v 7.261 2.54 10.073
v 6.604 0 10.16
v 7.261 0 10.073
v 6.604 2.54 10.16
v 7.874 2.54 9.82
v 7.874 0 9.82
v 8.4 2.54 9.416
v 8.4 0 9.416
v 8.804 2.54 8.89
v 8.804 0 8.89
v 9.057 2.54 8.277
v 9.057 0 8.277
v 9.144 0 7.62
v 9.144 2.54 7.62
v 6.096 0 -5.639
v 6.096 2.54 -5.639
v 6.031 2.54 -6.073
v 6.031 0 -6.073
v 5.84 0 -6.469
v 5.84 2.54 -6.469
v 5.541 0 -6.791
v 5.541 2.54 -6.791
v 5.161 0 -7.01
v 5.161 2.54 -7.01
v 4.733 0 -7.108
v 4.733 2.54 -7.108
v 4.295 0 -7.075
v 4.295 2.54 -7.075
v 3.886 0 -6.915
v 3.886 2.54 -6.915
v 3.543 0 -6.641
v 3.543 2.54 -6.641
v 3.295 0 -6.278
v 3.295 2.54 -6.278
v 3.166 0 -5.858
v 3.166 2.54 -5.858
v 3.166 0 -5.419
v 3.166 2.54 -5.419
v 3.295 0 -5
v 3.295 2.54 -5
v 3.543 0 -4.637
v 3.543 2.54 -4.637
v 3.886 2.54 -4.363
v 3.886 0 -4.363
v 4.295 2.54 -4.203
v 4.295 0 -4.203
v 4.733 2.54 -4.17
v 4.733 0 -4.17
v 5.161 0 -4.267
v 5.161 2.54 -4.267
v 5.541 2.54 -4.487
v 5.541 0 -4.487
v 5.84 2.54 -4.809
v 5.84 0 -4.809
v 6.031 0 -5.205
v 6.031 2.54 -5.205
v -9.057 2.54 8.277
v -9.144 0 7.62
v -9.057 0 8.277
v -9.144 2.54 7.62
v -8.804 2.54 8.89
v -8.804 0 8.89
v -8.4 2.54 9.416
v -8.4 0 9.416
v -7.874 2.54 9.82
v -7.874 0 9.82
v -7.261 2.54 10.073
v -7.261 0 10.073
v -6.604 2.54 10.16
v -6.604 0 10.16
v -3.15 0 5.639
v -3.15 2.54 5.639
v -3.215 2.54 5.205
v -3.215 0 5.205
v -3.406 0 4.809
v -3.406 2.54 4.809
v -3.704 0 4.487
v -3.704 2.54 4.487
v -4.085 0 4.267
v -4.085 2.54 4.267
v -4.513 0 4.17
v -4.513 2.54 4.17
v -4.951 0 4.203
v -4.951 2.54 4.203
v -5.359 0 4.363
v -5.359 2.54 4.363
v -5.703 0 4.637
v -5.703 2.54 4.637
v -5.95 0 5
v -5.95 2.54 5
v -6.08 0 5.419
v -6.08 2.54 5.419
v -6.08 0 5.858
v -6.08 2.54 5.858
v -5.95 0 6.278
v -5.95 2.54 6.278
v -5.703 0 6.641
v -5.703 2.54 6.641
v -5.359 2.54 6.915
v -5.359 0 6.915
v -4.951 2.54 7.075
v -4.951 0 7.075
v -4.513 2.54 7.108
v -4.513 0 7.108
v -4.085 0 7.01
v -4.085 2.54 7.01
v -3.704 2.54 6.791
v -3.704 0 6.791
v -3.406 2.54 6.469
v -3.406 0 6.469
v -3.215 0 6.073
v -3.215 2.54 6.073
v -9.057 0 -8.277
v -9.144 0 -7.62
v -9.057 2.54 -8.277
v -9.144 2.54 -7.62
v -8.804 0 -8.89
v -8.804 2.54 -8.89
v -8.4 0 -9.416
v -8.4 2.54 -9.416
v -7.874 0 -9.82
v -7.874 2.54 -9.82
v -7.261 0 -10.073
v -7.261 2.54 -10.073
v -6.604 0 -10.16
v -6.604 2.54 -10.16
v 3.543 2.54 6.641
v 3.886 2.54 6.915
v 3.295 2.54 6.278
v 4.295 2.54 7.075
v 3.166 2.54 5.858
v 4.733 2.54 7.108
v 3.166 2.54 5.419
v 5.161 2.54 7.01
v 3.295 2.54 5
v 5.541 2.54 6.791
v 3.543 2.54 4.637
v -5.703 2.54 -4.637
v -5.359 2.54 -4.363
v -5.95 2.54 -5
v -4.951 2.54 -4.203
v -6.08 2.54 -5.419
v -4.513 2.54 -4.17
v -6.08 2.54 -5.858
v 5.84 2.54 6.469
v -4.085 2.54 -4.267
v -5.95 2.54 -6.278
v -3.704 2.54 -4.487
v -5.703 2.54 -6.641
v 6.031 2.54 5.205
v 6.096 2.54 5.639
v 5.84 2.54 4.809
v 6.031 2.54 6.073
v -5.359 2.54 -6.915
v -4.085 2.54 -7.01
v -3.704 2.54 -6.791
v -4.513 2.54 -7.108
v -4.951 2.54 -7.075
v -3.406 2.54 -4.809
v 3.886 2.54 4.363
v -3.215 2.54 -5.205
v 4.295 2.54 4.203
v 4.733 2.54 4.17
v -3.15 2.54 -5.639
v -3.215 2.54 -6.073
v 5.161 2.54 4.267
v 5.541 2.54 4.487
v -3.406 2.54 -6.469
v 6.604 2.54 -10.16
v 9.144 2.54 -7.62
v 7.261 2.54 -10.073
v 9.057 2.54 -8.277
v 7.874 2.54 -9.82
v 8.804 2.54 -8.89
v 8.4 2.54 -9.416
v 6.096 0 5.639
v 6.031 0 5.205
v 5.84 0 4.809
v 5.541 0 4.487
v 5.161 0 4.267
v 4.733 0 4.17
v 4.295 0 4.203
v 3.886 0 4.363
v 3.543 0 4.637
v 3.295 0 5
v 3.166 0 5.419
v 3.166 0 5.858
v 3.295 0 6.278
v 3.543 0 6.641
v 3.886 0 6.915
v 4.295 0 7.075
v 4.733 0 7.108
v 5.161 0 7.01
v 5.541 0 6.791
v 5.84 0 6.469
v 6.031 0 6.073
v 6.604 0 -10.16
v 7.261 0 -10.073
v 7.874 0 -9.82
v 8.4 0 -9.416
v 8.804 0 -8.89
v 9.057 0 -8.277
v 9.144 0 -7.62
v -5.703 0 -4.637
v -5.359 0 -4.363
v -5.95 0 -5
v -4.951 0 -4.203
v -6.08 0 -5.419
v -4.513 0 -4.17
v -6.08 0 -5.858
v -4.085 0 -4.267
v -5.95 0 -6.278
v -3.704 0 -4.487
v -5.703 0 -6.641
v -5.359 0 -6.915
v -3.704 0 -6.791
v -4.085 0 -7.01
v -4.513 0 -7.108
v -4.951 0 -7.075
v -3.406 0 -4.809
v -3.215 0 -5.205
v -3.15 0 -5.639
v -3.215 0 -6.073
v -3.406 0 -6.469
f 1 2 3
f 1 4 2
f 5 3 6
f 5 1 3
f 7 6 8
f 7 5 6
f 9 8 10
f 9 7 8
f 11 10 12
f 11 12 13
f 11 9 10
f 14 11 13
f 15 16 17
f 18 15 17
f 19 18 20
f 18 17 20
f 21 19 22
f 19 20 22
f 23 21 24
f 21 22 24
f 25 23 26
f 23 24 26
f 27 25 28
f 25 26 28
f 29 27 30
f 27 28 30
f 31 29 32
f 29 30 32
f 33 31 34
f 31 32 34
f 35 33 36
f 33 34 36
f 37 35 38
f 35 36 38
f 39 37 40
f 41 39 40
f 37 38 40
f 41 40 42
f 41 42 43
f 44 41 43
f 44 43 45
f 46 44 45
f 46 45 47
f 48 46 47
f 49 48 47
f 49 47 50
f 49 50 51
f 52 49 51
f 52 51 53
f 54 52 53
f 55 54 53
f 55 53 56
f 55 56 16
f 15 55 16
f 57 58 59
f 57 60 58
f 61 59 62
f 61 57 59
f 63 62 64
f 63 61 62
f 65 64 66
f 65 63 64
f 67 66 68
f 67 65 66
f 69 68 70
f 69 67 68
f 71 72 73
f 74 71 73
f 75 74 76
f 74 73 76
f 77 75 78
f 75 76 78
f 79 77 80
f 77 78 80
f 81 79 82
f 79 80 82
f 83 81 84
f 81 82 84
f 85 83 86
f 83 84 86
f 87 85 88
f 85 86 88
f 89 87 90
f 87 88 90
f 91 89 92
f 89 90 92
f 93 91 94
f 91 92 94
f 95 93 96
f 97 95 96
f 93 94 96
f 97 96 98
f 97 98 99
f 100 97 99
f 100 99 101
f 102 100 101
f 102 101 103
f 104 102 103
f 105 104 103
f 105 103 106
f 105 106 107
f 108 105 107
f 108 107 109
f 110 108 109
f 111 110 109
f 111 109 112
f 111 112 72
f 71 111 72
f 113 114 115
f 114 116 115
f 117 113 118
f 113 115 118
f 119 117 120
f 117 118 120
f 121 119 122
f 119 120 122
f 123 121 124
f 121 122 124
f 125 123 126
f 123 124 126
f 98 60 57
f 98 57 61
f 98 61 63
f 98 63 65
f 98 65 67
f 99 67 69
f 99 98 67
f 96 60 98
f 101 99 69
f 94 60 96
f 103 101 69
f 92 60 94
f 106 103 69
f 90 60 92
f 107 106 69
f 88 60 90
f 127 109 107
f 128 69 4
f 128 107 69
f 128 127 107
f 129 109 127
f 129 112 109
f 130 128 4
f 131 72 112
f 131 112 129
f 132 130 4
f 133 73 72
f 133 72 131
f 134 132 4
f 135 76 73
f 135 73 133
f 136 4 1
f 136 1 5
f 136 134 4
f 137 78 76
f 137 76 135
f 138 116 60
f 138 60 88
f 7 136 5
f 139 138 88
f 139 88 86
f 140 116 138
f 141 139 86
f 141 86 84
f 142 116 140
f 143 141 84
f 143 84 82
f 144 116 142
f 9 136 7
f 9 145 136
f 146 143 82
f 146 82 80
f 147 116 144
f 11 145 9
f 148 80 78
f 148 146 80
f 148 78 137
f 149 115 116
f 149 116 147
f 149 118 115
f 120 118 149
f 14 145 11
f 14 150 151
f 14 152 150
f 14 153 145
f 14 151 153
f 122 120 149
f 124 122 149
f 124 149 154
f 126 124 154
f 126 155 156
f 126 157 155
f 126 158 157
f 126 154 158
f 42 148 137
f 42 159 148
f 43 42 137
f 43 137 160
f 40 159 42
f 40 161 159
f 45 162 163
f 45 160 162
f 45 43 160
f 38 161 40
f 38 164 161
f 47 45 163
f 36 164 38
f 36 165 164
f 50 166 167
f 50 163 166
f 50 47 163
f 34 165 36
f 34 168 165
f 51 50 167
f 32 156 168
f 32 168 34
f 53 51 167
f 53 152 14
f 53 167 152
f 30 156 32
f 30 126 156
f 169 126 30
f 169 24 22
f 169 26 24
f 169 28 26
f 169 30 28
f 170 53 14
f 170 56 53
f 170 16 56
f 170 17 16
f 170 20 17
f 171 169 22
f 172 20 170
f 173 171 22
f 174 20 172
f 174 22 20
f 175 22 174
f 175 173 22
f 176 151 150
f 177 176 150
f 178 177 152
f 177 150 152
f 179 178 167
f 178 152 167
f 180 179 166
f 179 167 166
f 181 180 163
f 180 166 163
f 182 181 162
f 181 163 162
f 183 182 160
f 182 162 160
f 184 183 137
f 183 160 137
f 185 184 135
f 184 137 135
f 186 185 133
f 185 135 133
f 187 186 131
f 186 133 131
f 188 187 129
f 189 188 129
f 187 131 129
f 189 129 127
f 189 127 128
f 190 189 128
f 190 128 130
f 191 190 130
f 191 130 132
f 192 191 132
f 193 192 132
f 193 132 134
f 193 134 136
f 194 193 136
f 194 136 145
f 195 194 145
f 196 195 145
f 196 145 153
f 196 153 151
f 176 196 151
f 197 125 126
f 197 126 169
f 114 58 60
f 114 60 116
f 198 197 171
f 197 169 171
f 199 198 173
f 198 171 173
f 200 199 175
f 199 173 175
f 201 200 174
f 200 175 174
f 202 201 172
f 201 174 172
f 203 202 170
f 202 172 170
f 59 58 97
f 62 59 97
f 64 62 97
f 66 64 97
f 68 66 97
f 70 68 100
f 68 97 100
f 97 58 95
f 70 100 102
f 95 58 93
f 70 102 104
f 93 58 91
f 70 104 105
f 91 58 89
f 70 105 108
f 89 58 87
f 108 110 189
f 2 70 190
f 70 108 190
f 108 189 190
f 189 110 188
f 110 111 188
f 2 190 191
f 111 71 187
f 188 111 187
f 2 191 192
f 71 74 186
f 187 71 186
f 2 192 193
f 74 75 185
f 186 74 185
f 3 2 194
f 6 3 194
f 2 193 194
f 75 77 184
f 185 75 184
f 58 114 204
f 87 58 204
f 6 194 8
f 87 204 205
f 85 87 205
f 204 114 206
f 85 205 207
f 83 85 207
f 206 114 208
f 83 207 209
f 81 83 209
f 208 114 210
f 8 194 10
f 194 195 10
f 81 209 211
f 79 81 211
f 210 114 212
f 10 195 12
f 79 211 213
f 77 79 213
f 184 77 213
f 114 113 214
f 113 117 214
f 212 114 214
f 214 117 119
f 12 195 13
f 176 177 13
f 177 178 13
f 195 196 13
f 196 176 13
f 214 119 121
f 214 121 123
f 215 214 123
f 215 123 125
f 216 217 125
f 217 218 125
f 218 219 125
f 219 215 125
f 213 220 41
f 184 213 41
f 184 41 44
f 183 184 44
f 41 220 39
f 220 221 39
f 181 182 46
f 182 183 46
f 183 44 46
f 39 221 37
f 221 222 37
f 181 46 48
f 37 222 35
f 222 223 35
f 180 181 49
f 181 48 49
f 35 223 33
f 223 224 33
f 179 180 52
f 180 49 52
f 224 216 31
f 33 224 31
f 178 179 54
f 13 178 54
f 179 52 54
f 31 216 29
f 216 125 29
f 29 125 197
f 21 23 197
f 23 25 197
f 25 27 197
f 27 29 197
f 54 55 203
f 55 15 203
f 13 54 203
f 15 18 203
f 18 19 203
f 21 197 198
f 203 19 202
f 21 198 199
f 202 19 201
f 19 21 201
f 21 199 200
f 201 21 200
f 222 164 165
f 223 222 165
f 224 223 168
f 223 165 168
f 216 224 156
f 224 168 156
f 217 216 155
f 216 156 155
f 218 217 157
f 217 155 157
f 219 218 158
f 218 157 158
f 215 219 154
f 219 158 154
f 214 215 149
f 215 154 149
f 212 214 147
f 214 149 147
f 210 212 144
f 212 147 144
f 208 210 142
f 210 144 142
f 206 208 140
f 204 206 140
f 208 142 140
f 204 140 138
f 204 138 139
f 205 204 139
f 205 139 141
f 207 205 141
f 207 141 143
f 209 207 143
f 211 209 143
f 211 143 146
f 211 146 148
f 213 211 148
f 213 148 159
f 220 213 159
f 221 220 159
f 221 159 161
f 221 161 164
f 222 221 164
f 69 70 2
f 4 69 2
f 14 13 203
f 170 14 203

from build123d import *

# Parameters (mm, degrees)
SKETCH1_W           = 18.288
SKETCH1_H           = 20.32
BOSS_EXTRUDE1_DEPTH = 2.54
SKETCH2_R           = 1.4732
CUT_EXTRUDE1_DEPTH  = 3.54
FILLET1_R           = 2.54


with BuildPart() as part:
    # Sketch1 → Boss-Extrude1 (new body)
    with BuildSketch(Plane(origin=(0, 0, 0), x_dir=(1, 0, 0), z_dir=(0, 1, 0))):
        Rectangle(SKETCH1_W, SKETCH1_H)
    extrude(amount=BOSS_EXTRUDE1_DEPTH)

    # Sketch2 → Cut-Extrude1 (cut, through all)
    with BuildSketch(Plane(origin=(0, 2.54, 0), x_dir=(1, 0, 0), z_dir=(0, 1, 0))):
        with Locations((-4.6228, 5.6388)):
            Circle(SKETCH2_R)
        with Locations((-4.6228, -5.6388)):
            Circle(SKETCH2_R)
        with Locations((4.6228, -5.6388)):
            Circle(SKETCH2_R)
        with Locations((4.6228, 5.6388)):
            Circle(SKETCH2_R)
    extrude(amount=-CUT_EXTRUDE1_DEPTH, mode=Mode.SUBTRACT)

    # Fillet1
    fillet1_edges = [part.edges().sort_by_distance(p)[0] for p in [
        (9.144, 1.27, 10.16),
        (-9.144, 1.27, 10.16),
        (-9.144, 1.27, -10.16),
        (9.144, 1.27, -10.16),
    ]]
    fillet(fillet1_edges, radius=FILLET1_R)


solid = part.part
